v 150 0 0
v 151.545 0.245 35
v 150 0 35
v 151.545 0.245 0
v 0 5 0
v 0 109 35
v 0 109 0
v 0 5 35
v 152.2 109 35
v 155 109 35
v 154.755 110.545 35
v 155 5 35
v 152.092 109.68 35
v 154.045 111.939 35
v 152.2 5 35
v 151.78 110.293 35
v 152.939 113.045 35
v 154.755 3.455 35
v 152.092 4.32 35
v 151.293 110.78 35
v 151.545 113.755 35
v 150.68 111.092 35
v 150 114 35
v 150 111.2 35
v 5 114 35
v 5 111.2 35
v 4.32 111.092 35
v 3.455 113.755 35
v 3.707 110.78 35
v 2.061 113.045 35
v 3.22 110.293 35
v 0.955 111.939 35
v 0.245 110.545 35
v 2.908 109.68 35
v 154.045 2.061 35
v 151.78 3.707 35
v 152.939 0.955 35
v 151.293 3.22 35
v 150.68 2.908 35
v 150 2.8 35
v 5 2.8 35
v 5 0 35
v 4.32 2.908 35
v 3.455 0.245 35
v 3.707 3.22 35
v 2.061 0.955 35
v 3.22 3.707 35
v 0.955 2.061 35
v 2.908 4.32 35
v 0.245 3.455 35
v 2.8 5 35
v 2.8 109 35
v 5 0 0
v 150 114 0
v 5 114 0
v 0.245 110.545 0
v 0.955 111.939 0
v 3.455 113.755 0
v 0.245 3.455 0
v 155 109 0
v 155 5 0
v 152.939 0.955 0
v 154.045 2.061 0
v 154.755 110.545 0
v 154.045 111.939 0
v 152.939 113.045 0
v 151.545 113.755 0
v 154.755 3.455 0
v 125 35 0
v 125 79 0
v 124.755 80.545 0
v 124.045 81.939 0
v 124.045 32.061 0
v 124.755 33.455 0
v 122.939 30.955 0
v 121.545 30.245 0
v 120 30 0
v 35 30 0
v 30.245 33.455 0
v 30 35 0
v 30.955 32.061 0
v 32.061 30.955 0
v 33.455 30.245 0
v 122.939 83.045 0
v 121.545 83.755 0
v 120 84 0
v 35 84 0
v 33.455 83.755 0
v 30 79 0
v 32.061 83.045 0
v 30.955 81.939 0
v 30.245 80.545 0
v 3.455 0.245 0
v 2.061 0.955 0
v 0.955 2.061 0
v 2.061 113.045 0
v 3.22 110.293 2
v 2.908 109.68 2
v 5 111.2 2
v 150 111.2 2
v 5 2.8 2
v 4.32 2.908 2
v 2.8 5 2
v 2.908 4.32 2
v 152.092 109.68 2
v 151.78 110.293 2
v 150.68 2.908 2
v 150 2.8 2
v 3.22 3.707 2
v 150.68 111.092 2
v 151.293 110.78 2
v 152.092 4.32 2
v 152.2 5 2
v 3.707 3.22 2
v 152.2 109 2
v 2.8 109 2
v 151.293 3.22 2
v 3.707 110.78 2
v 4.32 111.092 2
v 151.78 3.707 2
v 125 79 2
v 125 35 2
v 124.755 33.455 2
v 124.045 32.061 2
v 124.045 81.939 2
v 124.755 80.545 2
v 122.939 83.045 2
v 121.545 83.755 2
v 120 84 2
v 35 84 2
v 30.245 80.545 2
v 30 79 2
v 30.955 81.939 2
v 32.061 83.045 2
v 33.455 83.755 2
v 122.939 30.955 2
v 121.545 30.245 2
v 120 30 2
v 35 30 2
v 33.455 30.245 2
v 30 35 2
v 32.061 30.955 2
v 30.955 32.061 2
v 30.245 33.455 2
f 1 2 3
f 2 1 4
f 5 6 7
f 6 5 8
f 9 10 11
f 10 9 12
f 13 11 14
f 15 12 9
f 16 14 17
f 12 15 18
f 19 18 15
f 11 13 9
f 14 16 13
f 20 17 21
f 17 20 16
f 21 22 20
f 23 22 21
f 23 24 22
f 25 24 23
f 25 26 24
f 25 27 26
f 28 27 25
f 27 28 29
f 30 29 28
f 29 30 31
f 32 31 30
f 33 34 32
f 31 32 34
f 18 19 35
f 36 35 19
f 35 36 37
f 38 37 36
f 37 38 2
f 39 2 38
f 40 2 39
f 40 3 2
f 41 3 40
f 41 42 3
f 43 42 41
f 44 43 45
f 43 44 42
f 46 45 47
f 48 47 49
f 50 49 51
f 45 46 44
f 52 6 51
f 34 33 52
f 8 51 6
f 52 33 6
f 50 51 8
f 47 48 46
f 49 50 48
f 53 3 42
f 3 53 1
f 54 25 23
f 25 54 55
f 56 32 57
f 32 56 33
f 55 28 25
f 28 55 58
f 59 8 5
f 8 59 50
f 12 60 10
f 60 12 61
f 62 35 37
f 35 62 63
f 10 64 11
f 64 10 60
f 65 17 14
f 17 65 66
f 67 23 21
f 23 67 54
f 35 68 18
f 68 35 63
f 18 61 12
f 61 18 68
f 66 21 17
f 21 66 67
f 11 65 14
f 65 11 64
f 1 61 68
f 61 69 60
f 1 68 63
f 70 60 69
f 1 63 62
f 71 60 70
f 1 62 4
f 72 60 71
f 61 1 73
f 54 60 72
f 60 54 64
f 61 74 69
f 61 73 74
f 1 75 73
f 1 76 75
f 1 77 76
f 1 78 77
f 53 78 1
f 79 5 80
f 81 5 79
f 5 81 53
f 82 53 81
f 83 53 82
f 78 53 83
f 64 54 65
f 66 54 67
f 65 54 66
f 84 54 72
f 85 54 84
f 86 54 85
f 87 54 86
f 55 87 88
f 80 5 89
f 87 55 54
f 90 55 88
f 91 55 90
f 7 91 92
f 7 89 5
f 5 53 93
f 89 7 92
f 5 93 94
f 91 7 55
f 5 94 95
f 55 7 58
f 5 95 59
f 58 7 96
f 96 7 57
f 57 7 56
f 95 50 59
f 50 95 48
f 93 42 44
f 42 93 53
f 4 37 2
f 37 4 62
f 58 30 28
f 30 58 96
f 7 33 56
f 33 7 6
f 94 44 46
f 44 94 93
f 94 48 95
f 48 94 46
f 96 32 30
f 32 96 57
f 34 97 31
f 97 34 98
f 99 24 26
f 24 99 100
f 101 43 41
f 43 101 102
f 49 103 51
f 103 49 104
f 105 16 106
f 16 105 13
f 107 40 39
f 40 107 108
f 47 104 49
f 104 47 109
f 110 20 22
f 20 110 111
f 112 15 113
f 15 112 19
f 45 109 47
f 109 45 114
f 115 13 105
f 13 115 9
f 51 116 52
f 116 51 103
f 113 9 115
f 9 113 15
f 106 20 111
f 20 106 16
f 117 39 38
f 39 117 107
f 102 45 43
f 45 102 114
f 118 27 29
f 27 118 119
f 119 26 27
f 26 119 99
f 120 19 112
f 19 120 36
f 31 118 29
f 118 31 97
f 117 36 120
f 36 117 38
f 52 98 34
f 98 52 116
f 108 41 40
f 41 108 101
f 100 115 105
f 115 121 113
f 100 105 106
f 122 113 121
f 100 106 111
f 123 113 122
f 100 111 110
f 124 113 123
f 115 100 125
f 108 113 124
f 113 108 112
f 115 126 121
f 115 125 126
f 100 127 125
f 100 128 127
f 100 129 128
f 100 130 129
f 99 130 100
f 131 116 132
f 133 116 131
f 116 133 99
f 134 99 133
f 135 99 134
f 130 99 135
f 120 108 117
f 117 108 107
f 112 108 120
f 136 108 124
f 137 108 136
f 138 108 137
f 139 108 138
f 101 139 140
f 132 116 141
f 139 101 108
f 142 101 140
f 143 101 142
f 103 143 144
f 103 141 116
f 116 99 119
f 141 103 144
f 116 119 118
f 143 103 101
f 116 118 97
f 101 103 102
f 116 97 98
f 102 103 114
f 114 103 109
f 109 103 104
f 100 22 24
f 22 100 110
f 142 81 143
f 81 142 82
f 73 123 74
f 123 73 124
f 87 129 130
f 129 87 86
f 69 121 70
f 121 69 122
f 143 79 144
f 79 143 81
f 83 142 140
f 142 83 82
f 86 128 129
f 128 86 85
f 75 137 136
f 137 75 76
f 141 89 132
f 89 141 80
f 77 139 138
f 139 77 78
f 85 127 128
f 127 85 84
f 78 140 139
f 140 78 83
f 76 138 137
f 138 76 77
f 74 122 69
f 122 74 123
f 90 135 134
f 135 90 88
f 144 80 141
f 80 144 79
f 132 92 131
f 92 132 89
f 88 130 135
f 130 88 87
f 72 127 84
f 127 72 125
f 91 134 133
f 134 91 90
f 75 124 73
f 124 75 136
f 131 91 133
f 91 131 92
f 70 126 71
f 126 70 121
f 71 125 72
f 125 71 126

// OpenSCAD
$fn=20;

w=2.8;
x=155;
y=114;
z=35;
b=30;

difference() {
    cube_rounded(v=[x,y,z], r=5);
    translate(v = [w,w,2]) cube_rounded([x-2*w,y-2*w,z], r=5-w);
    translate(v = [b,b,0]) cube_rounded([x-2*b,y-2*b,z], r=5);
}

module cube_rounded(v, r=3, center=false){
    translate(center==true ? [r-v[0]/2,r-v[1]/2,v[2]/2] : [r,r,0])
    hull(){
        cylinder(h = v[2], r = r);
        translate(v = [0,v[1]-2*r,0]) cylinder(h = v[2], r = r);
        translate(v = [v[0]-2*r,v[1]-2*r,0]) cylinder(h = v[2], r = r);
        translate(v = [v[0]-2*r,0,0]) cylinder(h = v[2], r = r);
    }
}
